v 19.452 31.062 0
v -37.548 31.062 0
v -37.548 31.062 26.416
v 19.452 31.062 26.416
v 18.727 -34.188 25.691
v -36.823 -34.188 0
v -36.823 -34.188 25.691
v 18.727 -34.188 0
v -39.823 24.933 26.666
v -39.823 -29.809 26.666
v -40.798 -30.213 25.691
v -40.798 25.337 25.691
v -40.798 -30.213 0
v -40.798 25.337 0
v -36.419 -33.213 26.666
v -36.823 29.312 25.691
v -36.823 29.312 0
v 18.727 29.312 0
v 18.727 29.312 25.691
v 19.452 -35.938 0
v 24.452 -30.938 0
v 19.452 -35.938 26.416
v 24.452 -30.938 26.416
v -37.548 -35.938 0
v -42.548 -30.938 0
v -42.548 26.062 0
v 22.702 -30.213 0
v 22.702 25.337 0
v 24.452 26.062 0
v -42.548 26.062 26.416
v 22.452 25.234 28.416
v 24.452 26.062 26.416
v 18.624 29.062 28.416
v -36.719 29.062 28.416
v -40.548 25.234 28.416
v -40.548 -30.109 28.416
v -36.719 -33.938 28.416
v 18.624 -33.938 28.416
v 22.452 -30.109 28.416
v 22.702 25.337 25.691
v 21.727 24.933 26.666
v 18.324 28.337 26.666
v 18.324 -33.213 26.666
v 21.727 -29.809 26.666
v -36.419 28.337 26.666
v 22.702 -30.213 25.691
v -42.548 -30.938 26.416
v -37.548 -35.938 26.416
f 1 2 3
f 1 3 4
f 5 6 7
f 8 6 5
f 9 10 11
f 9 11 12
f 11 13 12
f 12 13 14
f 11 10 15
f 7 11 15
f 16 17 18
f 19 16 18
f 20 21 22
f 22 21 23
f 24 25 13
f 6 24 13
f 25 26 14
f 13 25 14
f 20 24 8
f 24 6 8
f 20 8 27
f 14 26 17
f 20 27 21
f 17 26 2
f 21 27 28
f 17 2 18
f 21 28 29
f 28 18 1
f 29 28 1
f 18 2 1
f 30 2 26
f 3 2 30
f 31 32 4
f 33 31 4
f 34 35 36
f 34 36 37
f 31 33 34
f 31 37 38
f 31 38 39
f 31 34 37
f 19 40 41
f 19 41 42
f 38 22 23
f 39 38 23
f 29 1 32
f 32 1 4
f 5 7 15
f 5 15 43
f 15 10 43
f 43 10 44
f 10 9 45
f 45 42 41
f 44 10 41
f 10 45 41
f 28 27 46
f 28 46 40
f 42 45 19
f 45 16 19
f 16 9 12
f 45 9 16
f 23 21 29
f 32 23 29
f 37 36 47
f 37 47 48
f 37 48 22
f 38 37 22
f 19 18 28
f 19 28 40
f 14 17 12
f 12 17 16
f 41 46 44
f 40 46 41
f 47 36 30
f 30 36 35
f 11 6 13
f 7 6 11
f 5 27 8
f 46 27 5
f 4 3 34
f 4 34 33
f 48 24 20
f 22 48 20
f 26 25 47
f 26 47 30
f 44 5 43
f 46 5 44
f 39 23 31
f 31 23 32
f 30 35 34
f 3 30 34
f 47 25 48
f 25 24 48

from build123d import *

# Parameters (mm, degrees)
F0_W     = 67
F0_H     = 67
F1_DEPTH = 28.416
F2_SIZE  = 5
F3_SIZE  = 2
F4_T     = -1.75


with BuildPart() as f1:
    # F0 (on Top) → F1 (new body)
    with BuildSketch(Plane.XY):
        with Locations((-9.047817, -2.437839)):
            Rectangle(F0_W, F0_H)
    extrude(amount=F1_DEPTH)

    # F2
    f2_edges = [f1.edges().sort_by_distance(p)[0] for p in [
        (-42.547817, -35.937839, 14.208),
        (24.452183, -35.937839, 14.208),
        (24.452183, 31.062161, 14.208),
        (-42.547817, 31.062161, 14.208),
    ]]
    chamfer(f2_edges, length=F2_SIZE)

    # F3
    f3_edges = [f1.edges().sort_by_distance(p)[0] for p in [
        (-9.047817, 31.062161, 28.416),
        (21.952183, 28.562161, 28.416),
        (-40.047817, 28.562161, 28.416),
        (24.452183, -2.437839, 28.416),
        (-42.547817, -2.437839, 28.416),
        (21.952183, -33.437839, 28.416),
        (-40.047817, -33.437839, 28.416),
        (-9.047817, -35.937839, 28.416),
    ]]
    chamfer(f3_edges, length=F3_SIZE)

    # F4
    f4_openings = [f1.faces().sort_by_distance(p)[0] for p in [
        (-9.047817, -2.437839, 0),
    ]]
    offset(amount=F4_T, openings=f4_openings)


solid = f1.part
